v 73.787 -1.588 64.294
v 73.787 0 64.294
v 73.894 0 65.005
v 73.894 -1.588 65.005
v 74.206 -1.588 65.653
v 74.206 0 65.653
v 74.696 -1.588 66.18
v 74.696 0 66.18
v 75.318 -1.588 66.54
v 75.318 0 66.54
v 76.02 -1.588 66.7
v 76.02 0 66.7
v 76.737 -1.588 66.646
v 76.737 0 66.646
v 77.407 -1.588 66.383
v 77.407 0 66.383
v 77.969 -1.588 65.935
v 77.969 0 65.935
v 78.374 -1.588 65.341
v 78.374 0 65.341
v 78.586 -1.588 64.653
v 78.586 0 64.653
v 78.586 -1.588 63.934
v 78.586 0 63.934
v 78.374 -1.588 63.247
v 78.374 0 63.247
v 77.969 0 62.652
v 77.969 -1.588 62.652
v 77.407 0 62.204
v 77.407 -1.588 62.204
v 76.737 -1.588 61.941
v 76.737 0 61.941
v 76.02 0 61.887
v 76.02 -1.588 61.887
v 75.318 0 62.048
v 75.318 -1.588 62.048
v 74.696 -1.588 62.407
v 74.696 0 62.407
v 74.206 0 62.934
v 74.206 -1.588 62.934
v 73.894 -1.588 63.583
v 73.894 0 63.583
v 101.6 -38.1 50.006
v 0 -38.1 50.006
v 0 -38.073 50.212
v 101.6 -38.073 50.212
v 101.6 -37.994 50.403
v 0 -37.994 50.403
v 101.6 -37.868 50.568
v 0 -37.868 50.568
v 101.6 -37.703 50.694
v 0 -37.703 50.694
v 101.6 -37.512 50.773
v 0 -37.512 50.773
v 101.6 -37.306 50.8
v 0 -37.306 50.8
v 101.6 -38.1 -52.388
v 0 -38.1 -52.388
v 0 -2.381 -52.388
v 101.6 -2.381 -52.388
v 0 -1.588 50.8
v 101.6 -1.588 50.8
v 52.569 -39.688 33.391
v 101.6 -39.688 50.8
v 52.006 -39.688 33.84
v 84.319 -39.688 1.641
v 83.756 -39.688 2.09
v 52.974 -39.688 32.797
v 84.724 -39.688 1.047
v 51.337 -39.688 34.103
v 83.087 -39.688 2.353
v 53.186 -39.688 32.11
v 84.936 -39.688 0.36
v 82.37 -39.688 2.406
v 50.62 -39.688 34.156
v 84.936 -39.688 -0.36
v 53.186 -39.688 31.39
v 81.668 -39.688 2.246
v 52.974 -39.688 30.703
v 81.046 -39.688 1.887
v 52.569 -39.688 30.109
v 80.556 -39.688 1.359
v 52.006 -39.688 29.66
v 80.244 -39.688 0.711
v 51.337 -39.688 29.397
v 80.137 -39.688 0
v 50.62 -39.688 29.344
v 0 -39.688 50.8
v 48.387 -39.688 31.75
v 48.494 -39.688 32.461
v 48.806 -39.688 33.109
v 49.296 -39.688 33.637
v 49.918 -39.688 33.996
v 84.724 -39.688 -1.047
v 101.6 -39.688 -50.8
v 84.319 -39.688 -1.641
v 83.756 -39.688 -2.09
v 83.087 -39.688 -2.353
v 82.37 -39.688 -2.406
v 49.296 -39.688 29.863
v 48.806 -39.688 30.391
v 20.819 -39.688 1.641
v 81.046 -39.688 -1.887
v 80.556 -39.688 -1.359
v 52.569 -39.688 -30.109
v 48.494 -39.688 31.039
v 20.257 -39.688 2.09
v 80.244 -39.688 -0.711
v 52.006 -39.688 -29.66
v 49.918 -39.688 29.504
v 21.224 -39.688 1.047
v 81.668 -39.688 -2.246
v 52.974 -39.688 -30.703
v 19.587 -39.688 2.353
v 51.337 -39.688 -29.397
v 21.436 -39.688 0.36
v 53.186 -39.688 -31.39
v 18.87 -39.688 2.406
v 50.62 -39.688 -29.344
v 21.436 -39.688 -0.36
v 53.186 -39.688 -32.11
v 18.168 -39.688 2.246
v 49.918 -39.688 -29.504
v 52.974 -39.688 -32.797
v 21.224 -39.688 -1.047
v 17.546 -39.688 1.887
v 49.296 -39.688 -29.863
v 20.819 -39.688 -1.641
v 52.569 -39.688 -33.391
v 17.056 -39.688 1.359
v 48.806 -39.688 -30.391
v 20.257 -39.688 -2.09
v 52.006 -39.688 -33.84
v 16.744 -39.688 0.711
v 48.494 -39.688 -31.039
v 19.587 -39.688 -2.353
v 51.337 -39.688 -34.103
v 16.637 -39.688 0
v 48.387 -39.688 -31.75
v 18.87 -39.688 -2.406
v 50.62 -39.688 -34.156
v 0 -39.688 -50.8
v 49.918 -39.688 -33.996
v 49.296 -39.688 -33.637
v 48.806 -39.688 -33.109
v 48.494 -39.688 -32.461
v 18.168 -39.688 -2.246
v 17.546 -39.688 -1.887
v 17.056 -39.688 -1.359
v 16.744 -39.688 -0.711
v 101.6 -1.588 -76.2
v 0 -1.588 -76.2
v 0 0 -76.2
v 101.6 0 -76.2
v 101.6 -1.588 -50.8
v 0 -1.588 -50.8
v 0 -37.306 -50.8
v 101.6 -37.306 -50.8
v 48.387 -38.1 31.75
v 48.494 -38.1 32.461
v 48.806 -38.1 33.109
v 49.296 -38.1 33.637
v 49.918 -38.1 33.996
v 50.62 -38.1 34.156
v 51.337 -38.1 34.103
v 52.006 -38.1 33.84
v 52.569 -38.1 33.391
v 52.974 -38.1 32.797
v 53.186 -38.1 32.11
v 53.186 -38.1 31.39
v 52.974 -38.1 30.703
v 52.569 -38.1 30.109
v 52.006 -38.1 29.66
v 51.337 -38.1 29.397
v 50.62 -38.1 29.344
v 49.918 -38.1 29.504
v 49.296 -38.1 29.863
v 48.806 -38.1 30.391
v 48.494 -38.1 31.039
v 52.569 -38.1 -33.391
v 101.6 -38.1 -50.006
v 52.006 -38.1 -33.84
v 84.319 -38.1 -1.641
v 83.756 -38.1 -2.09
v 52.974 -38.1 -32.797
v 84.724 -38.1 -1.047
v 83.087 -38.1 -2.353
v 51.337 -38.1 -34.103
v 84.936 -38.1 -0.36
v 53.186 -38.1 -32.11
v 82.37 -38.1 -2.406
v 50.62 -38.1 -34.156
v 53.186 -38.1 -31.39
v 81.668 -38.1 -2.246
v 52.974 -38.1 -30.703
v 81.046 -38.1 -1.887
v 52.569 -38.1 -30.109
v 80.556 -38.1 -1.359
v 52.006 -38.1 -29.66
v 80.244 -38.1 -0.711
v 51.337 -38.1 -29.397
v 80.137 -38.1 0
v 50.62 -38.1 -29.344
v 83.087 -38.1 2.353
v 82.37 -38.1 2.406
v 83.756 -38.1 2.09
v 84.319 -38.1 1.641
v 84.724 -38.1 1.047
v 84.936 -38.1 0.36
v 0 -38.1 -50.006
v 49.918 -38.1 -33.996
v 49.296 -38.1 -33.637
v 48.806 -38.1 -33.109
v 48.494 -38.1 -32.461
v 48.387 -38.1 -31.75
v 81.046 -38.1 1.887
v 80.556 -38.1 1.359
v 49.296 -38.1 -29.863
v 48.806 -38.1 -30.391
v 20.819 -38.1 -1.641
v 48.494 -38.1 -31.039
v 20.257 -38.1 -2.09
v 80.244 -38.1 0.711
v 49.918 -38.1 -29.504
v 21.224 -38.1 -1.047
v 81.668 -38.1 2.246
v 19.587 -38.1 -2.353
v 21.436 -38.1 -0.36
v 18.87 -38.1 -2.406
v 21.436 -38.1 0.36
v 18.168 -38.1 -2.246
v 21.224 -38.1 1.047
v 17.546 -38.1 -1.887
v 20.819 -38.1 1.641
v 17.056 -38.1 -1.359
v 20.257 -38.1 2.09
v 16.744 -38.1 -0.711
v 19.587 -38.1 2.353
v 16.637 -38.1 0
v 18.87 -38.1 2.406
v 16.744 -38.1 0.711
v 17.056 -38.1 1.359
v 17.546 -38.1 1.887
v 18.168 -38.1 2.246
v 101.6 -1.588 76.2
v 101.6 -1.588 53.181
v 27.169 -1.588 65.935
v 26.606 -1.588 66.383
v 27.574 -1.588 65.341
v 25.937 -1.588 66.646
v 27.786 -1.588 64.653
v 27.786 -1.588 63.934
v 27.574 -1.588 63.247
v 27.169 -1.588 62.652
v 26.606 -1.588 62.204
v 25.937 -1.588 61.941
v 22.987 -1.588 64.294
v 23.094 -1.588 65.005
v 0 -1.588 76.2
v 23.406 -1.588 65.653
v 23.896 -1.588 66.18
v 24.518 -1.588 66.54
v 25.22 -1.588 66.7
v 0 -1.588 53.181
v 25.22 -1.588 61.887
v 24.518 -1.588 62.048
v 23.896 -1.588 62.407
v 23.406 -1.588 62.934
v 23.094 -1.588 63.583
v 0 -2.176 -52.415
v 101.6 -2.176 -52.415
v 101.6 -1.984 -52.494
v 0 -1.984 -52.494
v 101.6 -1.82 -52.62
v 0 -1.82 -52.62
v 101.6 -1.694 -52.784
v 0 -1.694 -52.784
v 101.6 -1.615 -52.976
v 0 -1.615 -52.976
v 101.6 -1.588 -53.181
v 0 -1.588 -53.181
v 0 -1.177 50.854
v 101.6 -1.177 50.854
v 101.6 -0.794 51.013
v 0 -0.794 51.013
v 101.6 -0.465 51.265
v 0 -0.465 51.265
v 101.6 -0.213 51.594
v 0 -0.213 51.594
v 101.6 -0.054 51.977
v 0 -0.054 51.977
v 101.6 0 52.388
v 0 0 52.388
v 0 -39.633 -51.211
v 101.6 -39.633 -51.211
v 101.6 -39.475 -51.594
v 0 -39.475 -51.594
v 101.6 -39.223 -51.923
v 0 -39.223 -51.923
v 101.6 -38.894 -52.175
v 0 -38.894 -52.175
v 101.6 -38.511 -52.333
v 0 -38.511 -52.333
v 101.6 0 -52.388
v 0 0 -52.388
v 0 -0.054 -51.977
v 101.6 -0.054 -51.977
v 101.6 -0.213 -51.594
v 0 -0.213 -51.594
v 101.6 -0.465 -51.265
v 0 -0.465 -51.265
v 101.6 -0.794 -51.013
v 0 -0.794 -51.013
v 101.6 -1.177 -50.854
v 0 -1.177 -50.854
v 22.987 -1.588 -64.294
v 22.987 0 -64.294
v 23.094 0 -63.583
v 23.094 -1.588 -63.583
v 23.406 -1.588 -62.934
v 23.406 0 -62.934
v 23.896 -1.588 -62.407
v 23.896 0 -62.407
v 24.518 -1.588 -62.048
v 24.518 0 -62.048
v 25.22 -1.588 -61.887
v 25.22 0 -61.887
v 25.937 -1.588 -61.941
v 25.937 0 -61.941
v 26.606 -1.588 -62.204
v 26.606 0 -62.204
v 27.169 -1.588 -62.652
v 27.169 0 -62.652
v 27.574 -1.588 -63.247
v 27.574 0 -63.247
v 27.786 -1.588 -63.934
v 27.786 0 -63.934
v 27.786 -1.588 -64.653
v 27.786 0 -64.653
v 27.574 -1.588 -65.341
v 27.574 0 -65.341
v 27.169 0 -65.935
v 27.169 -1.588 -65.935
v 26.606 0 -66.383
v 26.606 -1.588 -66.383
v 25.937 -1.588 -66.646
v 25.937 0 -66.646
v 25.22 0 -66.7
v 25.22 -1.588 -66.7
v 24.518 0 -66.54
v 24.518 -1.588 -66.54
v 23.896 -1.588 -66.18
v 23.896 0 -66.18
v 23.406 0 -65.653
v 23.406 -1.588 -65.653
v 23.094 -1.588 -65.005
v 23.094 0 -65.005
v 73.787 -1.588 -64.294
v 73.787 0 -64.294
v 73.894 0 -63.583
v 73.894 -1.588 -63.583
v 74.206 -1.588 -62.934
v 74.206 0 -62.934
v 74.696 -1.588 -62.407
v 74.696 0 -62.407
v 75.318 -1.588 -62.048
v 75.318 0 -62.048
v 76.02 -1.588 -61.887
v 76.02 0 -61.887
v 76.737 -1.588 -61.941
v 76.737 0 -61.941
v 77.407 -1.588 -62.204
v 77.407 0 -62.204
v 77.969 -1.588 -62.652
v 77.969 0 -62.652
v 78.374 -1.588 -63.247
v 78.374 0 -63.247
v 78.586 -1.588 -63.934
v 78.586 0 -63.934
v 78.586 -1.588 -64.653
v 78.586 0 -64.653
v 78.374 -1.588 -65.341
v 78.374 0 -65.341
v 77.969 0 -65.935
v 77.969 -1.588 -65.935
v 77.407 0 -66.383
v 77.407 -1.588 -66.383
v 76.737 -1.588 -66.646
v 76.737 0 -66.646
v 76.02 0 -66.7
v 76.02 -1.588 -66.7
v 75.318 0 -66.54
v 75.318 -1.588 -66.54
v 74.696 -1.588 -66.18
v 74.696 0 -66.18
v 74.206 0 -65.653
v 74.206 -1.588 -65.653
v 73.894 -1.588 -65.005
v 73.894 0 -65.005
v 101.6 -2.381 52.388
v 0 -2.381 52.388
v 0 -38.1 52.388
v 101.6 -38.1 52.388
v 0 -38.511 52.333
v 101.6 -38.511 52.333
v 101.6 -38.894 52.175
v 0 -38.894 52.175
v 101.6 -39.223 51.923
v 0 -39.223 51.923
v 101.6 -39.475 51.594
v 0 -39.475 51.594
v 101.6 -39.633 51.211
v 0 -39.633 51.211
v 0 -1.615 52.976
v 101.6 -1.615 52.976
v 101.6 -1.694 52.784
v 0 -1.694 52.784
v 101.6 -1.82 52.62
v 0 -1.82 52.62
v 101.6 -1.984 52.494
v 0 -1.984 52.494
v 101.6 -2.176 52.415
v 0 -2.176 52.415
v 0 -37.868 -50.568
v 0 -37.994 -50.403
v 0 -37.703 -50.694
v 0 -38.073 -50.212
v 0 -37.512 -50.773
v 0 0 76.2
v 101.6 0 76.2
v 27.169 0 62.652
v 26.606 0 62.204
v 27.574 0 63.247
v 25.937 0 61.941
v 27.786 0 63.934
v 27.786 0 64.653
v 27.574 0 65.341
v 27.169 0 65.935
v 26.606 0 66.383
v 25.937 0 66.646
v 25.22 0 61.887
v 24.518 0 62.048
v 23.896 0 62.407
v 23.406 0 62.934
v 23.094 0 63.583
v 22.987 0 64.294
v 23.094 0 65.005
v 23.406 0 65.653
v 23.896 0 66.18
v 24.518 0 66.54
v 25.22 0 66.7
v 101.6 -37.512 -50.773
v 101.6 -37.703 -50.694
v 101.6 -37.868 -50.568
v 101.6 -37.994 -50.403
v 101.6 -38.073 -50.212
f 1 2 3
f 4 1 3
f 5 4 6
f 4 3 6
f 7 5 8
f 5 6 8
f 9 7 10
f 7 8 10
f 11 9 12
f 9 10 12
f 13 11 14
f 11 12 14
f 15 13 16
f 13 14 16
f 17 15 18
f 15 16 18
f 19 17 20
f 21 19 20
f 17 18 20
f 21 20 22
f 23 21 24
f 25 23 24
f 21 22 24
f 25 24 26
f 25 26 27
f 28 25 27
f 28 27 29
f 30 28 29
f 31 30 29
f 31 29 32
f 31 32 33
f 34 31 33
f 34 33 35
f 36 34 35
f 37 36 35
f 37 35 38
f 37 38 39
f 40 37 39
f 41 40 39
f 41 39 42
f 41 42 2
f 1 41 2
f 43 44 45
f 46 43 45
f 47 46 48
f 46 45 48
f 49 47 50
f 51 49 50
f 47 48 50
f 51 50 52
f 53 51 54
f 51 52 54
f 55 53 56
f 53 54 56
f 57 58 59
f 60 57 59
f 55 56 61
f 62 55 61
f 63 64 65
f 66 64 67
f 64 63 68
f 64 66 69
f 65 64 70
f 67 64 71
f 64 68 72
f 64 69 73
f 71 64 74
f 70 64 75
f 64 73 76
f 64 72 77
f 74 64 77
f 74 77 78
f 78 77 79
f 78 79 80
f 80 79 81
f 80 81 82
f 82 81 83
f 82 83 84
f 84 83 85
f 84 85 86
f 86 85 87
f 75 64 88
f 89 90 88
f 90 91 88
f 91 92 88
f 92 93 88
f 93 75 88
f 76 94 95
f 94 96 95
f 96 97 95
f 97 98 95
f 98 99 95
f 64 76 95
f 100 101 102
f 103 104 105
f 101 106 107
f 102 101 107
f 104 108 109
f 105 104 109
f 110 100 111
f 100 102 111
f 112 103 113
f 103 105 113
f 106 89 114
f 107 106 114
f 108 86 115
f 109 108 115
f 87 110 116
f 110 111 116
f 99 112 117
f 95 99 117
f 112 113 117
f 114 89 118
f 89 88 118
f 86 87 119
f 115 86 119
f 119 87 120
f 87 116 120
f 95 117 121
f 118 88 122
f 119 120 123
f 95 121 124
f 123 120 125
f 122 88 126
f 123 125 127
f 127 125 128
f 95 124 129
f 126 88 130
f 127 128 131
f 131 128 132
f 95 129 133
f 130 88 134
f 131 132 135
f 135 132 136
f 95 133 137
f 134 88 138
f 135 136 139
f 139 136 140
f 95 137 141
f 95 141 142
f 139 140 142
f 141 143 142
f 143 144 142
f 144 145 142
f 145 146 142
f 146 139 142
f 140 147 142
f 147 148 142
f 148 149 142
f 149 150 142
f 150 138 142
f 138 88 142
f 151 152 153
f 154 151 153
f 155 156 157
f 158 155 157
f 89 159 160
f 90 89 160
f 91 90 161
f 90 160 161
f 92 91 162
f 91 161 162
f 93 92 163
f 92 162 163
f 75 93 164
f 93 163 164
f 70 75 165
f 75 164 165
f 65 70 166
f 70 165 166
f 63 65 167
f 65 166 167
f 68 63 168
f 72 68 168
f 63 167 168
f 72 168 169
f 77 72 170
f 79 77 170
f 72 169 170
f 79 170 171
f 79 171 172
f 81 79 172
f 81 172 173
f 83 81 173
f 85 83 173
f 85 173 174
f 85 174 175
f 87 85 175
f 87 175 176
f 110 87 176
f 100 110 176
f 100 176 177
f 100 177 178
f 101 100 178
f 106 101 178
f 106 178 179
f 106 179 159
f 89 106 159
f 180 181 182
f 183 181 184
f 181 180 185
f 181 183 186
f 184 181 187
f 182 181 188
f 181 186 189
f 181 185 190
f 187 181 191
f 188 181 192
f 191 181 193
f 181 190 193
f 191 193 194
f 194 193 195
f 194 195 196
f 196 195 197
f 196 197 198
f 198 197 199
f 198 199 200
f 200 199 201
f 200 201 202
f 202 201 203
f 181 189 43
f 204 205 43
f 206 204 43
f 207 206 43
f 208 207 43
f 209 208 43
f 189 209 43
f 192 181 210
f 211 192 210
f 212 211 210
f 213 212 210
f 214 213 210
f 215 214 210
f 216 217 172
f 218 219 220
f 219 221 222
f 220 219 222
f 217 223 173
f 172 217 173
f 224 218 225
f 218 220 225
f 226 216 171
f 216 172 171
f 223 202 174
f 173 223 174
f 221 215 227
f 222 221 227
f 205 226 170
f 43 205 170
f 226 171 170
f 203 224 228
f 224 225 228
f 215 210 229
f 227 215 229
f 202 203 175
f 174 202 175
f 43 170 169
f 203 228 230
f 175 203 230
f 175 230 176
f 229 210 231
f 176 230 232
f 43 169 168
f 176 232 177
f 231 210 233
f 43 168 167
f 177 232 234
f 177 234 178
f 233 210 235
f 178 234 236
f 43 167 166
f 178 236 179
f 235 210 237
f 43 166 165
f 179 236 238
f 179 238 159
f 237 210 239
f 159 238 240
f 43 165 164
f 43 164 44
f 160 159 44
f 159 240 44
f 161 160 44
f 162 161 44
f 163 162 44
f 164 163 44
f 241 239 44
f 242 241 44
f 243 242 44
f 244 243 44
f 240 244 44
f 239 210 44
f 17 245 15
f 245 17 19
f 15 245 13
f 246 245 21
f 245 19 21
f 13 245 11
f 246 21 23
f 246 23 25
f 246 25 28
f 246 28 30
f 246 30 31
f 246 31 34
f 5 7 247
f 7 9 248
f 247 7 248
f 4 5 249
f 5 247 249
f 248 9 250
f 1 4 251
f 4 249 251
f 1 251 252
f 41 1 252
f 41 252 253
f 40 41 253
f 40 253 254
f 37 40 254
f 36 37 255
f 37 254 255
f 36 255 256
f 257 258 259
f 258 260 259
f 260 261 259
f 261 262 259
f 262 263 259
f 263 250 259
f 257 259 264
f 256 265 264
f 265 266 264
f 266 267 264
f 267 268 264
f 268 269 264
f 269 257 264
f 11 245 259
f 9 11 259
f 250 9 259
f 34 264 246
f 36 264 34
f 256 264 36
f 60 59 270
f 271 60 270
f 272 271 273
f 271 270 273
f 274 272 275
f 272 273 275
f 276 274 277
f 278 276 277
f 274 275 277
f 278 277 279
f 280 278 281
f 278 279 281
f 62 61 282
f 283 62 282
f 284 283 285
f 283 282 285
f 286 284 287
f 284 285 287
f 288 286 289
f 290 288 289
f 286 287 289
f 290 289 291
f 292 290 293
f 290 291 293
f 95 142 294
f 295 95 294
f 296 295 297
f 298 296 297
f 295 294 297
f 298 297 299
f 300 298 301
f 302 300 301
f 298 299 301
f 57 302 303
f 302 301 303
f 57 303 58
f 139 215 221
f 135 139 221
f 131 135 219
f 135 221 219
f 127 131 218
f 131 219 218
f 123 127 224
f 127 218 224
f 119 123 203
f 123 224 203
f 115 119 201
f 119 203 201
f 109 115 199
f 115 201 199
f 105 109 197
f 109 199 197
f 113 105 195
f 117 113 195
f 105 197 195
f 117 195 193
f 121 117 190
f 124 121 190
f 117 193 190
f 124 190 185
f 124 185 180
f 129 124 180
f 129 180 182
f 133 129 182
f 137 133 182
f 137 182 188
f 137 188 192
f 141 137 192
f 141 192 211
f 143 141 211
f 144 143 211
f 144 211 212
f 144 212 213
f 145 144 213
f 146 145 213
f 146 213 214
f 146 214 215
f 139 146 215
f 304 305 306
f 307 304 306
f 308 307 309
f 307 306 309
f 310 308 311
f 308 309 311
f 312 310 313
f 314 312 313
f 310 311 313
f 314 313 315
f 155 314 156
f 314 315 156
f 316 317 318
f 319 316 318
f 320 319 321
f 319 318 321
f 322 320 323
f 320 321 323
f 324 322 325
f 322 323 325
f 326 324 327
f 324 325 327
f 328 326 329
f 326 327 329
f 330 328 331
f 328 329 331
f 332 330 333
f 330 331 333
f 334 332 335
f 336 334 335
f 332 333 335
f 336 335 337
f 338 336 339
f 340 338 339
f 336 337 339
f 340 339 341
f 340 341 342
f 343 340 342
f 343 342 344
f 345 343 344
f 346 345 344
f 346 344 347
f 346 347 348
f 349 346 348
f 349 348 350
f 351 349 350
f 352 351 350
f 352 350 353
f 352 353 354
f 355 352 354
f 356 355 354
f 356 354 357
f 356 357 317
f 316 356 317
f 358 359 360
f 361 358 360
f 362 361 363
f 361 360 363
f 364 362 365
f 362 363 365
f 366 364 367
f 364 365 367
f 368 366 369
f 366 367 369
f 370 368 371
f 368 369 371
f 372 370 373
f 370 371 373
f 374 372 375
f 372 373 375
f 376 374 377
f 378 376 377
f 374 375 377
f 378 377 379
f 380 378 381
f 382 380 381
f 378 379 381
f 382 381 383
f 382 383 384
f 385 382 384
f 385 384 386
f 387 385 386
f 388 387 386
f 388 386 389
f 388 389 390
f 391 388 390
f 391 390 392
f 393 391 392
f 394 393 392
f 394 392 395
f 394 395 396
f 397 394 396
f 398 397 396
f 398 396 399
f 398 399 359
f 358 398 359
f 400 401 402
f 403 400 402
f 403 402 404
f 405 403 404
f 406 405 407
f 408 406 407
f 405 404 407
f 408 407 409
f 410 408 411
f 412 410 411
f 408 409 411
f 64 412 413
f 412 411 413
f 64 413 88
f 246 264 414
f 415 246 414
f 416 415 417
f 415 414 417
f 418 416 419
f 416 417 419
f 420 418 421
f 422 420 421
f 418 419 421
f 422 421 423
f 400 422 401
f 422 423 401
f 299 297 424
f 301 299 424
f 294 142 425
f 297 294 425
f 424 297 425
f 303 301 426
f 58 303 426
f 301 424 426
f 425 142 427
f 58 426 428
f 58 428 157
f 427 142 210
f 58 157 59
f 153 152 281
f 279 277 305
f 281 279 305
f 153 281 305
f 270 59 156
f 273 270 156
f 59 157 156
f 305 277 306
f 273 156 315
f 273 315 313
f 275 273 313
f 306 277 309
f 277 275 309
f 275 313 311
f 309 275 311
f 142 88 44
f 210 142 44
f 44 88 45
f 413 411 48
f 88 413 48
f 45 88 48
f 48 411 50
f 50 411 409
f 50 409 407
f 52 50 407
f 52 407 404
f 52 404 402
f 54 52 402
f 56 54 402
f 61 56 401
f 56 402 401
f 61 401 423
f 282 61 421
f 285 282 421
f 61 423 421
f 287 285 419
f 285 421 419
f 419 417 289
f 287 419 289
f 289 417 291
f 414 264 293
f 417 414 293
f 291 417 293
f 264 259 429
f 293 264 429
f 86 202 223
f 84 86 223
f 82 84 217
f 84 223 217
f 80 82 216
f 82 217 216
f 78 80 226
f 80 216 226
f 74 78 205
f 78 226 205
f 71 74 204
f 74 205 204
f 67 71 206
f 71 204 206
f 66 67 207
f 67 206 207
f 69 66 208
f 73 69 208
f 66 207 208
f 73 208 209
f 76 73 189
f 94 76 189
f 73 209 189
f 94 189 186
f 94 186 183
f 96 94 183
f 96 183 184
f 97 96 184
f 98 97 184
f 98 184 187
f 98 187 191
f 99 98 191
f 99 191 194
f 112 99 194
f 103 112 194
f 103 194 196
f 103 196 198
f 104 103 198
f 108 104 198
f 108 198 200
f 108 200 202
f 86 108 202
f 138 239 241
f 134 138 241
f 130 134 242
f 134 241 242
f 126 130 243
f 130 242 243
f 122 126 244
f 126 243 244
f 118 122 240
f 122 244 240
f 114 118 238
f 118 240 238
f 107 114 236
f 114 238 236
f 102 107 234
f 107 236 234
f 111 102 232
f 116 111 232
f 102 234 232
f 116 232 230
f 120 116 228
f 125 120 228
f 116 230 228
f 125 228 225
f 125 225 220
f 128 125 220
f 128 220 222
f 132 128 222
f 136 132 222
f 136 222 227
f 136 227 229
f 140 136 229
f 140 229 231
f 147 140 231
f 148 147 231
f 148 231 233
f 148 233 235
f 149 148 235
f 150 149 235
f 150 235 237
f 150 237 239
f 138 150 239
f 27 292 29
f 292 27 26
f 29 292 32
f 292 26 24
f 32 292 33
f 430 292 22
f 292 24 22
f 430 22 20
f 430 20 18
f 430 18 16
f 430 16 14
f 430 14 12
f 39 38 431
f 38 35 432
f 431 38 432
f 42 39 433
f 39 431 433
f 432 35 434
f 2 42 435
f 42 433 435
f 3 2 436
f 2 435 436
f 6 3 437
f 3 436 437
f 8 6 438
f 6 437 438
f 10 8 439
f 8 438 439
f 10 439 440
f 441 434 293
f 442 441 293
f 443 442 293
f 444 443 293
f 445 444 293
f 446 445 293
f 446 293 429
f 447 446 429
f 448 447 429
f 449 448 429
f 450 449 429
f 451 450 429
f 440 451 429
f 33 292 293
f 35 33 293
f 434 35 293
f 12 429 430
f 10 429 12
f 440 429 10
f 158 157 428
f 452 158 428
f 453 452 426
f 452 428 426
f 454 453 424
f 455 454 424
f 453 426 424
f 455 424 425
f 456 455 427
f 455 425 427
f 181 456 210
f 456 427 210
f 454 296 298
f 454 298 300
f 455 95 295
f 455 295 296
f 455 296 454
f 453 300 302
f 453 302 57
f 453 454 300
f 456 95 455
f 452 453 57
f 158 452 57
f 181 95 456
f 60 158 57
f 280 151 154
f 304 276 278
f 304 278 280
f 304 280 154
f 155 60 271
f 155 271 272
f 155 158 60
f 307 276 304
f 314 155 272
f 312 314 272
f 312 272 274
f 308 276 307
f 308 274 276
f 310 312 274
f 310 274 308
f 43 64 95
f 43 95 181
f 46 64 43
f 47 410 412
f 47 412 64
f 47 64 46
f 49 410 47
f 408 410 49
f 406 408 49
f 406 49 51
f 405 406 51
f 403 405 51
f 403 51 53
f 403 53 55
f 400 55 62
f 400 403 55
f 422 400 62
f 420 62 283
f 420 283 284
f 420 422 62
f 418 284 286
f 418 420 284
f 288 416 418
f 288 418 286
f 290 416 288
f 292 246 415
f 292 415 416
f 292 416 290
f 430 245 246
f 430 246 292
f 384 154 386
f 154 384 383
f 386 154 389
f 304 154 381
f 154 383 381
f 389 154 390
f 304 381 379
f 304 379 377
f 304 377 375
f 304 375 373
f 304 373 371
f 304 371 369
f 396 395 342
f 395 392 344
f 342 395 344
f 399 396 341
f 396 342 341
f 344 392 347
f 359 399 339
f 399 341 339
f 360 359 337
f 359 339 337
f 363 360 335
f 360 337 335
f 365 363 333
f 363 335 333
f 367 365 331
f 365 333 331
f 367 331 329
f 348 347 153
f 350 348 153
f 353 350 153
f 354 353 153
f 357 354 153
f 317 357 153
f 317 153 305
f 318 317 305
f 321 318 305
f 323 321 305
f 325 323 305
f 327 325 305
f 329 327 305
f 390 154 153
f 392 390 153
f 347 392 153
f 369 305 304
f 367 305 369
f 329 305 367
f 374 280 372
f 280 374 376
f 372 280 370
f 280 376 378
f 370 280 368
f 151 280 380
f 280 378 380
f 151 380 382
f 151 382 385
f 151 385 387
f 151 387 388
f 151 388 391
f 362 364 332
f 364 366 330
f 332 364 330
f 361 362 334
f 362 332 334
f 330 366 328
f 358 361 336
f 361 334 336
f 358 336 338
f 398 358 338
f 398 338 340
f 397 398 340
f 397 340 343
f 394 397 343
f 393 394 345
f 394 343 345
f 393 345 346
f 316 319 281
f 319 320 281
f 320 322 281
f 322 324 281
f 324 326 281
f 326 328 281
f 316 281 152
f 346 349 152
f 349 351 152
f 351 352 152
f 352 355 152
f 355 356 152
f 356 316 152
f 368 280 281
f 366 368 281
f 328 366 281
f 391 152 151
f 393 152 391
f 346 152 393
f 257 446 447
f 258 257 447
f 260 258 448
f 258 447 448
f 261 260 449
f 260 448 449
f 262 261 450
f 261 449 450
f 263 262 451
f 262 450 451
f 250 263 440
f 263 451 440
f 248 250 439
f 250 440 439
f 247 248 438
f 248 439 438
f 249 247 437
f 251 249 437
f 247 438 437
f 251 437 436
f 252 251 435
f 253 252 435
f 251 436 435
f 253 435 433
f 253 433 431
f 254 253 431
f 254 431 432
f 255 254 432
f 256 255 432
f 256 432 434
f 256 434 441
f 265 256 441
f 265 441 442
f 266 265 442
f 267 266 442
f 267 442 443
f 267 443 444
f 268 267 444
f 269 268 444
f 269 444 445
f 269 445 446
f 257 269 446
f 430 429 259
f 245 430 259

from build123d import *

# Parameters (mm, degrees)
F1_DEPTH = 101.6
F3_D     = 4.826
F5_D     = 4.826
F7_D     = 4.826
F9_D     = 4.826


with BuildPart() as f1:
    # F0 (on Right) → F1 (new body)
    with BuildSketch(Plane.YZ):
        with BuildLine():
            Line((-37.30625, 50.8), (-1.5875, 50.8))
            ThreePointArc((-1.5875, 50.8), (-0.464968, 51.264968), (0, 52.3875))
            Line((0, 52.3875), (0, 76.2))
            Line((0, 76.2), (-1.5875, 76.2))
            Line((-1.5875, 76.2), (-1.5875, 53.18125))
            ThreePointArc((-1.5875, 53.18125), (-1.819984, 52.619984), (-2.38125, 52.3875))
            Line((-2.38125, 52.3875), (-38.1, 52.3875))
            ThreePointArc((-38.1, 52.3875), (-39.222532, 51.922532), (-39.6875, 50.8))
            Line((-39.6875, 50.8), (-39.6875, 0))
            Line((-39.6875, 0), (-39.6875, -50.8))
            ThreePointArc((-39.6875, -50.8), (-39.222532, -51.922532), (-38.1, -52.3875))
            Line((-38.1, -52.3875), (-2.38125, -52.3875))
            ThreePointArc((-2.38125, -52.3875), (-1.819984, -52.619984), (-1.5875, -53.18125))
            Line((-1.5875, -53.18125), (-1.5875, -76.2))
            Line((-1.5875, -76.2), (0, -76.2))
            Line((0, -76.2), (0, -52.3875))
            ThreePointArc((0, -52.3875), (-0.464968, -51.264968), (-1.5875, -50.8))
            Line((-1.5875, -50.8), (-37.30625, -50.8))
            ThreePointArc((-37.30625, -50.8), (-37.867516, -50.567516), (-38.1, -50.00625))
            Line((-38.1, -50.00625), (-38.1, 0))
            Line((-38.1, 0), (-38.1, 50.00625))
            ThreePointArc((-38.1, 50.00625), (-37.867516, 50.567516), (-37.30625, 50.8))
        make_face()
    extrude(amount=F1_DEPTH)

    # F3 (through all)
    with Locations(Plane.XZ.offset(1.5875)):
        with Locations((25.4, -64.29375), (76.2, -64.29375)):
            Hole(F3_D / 2)

    # F5 (through all)
    with Locations(Plane.XZ.offset(1.5875)):
        with Locations((25.4, 64.29375), (76.2, 64.29375)):
            Hole(F5_D / 2)

    # F7 (through all)
    with Locations(Plane.XZ.offset(39.6875)):
        with Locations((19.05, 0), (82.55, 0)):
            Hole(F7_D / 2)

    # F9 (through all)
    with Locations(Plane.XZ.offset(39.6875)):
        with Locations((50.8, -31.75), (50.8, 31.75)):
            Hole(F9_D / 2)


solid = f1.part
